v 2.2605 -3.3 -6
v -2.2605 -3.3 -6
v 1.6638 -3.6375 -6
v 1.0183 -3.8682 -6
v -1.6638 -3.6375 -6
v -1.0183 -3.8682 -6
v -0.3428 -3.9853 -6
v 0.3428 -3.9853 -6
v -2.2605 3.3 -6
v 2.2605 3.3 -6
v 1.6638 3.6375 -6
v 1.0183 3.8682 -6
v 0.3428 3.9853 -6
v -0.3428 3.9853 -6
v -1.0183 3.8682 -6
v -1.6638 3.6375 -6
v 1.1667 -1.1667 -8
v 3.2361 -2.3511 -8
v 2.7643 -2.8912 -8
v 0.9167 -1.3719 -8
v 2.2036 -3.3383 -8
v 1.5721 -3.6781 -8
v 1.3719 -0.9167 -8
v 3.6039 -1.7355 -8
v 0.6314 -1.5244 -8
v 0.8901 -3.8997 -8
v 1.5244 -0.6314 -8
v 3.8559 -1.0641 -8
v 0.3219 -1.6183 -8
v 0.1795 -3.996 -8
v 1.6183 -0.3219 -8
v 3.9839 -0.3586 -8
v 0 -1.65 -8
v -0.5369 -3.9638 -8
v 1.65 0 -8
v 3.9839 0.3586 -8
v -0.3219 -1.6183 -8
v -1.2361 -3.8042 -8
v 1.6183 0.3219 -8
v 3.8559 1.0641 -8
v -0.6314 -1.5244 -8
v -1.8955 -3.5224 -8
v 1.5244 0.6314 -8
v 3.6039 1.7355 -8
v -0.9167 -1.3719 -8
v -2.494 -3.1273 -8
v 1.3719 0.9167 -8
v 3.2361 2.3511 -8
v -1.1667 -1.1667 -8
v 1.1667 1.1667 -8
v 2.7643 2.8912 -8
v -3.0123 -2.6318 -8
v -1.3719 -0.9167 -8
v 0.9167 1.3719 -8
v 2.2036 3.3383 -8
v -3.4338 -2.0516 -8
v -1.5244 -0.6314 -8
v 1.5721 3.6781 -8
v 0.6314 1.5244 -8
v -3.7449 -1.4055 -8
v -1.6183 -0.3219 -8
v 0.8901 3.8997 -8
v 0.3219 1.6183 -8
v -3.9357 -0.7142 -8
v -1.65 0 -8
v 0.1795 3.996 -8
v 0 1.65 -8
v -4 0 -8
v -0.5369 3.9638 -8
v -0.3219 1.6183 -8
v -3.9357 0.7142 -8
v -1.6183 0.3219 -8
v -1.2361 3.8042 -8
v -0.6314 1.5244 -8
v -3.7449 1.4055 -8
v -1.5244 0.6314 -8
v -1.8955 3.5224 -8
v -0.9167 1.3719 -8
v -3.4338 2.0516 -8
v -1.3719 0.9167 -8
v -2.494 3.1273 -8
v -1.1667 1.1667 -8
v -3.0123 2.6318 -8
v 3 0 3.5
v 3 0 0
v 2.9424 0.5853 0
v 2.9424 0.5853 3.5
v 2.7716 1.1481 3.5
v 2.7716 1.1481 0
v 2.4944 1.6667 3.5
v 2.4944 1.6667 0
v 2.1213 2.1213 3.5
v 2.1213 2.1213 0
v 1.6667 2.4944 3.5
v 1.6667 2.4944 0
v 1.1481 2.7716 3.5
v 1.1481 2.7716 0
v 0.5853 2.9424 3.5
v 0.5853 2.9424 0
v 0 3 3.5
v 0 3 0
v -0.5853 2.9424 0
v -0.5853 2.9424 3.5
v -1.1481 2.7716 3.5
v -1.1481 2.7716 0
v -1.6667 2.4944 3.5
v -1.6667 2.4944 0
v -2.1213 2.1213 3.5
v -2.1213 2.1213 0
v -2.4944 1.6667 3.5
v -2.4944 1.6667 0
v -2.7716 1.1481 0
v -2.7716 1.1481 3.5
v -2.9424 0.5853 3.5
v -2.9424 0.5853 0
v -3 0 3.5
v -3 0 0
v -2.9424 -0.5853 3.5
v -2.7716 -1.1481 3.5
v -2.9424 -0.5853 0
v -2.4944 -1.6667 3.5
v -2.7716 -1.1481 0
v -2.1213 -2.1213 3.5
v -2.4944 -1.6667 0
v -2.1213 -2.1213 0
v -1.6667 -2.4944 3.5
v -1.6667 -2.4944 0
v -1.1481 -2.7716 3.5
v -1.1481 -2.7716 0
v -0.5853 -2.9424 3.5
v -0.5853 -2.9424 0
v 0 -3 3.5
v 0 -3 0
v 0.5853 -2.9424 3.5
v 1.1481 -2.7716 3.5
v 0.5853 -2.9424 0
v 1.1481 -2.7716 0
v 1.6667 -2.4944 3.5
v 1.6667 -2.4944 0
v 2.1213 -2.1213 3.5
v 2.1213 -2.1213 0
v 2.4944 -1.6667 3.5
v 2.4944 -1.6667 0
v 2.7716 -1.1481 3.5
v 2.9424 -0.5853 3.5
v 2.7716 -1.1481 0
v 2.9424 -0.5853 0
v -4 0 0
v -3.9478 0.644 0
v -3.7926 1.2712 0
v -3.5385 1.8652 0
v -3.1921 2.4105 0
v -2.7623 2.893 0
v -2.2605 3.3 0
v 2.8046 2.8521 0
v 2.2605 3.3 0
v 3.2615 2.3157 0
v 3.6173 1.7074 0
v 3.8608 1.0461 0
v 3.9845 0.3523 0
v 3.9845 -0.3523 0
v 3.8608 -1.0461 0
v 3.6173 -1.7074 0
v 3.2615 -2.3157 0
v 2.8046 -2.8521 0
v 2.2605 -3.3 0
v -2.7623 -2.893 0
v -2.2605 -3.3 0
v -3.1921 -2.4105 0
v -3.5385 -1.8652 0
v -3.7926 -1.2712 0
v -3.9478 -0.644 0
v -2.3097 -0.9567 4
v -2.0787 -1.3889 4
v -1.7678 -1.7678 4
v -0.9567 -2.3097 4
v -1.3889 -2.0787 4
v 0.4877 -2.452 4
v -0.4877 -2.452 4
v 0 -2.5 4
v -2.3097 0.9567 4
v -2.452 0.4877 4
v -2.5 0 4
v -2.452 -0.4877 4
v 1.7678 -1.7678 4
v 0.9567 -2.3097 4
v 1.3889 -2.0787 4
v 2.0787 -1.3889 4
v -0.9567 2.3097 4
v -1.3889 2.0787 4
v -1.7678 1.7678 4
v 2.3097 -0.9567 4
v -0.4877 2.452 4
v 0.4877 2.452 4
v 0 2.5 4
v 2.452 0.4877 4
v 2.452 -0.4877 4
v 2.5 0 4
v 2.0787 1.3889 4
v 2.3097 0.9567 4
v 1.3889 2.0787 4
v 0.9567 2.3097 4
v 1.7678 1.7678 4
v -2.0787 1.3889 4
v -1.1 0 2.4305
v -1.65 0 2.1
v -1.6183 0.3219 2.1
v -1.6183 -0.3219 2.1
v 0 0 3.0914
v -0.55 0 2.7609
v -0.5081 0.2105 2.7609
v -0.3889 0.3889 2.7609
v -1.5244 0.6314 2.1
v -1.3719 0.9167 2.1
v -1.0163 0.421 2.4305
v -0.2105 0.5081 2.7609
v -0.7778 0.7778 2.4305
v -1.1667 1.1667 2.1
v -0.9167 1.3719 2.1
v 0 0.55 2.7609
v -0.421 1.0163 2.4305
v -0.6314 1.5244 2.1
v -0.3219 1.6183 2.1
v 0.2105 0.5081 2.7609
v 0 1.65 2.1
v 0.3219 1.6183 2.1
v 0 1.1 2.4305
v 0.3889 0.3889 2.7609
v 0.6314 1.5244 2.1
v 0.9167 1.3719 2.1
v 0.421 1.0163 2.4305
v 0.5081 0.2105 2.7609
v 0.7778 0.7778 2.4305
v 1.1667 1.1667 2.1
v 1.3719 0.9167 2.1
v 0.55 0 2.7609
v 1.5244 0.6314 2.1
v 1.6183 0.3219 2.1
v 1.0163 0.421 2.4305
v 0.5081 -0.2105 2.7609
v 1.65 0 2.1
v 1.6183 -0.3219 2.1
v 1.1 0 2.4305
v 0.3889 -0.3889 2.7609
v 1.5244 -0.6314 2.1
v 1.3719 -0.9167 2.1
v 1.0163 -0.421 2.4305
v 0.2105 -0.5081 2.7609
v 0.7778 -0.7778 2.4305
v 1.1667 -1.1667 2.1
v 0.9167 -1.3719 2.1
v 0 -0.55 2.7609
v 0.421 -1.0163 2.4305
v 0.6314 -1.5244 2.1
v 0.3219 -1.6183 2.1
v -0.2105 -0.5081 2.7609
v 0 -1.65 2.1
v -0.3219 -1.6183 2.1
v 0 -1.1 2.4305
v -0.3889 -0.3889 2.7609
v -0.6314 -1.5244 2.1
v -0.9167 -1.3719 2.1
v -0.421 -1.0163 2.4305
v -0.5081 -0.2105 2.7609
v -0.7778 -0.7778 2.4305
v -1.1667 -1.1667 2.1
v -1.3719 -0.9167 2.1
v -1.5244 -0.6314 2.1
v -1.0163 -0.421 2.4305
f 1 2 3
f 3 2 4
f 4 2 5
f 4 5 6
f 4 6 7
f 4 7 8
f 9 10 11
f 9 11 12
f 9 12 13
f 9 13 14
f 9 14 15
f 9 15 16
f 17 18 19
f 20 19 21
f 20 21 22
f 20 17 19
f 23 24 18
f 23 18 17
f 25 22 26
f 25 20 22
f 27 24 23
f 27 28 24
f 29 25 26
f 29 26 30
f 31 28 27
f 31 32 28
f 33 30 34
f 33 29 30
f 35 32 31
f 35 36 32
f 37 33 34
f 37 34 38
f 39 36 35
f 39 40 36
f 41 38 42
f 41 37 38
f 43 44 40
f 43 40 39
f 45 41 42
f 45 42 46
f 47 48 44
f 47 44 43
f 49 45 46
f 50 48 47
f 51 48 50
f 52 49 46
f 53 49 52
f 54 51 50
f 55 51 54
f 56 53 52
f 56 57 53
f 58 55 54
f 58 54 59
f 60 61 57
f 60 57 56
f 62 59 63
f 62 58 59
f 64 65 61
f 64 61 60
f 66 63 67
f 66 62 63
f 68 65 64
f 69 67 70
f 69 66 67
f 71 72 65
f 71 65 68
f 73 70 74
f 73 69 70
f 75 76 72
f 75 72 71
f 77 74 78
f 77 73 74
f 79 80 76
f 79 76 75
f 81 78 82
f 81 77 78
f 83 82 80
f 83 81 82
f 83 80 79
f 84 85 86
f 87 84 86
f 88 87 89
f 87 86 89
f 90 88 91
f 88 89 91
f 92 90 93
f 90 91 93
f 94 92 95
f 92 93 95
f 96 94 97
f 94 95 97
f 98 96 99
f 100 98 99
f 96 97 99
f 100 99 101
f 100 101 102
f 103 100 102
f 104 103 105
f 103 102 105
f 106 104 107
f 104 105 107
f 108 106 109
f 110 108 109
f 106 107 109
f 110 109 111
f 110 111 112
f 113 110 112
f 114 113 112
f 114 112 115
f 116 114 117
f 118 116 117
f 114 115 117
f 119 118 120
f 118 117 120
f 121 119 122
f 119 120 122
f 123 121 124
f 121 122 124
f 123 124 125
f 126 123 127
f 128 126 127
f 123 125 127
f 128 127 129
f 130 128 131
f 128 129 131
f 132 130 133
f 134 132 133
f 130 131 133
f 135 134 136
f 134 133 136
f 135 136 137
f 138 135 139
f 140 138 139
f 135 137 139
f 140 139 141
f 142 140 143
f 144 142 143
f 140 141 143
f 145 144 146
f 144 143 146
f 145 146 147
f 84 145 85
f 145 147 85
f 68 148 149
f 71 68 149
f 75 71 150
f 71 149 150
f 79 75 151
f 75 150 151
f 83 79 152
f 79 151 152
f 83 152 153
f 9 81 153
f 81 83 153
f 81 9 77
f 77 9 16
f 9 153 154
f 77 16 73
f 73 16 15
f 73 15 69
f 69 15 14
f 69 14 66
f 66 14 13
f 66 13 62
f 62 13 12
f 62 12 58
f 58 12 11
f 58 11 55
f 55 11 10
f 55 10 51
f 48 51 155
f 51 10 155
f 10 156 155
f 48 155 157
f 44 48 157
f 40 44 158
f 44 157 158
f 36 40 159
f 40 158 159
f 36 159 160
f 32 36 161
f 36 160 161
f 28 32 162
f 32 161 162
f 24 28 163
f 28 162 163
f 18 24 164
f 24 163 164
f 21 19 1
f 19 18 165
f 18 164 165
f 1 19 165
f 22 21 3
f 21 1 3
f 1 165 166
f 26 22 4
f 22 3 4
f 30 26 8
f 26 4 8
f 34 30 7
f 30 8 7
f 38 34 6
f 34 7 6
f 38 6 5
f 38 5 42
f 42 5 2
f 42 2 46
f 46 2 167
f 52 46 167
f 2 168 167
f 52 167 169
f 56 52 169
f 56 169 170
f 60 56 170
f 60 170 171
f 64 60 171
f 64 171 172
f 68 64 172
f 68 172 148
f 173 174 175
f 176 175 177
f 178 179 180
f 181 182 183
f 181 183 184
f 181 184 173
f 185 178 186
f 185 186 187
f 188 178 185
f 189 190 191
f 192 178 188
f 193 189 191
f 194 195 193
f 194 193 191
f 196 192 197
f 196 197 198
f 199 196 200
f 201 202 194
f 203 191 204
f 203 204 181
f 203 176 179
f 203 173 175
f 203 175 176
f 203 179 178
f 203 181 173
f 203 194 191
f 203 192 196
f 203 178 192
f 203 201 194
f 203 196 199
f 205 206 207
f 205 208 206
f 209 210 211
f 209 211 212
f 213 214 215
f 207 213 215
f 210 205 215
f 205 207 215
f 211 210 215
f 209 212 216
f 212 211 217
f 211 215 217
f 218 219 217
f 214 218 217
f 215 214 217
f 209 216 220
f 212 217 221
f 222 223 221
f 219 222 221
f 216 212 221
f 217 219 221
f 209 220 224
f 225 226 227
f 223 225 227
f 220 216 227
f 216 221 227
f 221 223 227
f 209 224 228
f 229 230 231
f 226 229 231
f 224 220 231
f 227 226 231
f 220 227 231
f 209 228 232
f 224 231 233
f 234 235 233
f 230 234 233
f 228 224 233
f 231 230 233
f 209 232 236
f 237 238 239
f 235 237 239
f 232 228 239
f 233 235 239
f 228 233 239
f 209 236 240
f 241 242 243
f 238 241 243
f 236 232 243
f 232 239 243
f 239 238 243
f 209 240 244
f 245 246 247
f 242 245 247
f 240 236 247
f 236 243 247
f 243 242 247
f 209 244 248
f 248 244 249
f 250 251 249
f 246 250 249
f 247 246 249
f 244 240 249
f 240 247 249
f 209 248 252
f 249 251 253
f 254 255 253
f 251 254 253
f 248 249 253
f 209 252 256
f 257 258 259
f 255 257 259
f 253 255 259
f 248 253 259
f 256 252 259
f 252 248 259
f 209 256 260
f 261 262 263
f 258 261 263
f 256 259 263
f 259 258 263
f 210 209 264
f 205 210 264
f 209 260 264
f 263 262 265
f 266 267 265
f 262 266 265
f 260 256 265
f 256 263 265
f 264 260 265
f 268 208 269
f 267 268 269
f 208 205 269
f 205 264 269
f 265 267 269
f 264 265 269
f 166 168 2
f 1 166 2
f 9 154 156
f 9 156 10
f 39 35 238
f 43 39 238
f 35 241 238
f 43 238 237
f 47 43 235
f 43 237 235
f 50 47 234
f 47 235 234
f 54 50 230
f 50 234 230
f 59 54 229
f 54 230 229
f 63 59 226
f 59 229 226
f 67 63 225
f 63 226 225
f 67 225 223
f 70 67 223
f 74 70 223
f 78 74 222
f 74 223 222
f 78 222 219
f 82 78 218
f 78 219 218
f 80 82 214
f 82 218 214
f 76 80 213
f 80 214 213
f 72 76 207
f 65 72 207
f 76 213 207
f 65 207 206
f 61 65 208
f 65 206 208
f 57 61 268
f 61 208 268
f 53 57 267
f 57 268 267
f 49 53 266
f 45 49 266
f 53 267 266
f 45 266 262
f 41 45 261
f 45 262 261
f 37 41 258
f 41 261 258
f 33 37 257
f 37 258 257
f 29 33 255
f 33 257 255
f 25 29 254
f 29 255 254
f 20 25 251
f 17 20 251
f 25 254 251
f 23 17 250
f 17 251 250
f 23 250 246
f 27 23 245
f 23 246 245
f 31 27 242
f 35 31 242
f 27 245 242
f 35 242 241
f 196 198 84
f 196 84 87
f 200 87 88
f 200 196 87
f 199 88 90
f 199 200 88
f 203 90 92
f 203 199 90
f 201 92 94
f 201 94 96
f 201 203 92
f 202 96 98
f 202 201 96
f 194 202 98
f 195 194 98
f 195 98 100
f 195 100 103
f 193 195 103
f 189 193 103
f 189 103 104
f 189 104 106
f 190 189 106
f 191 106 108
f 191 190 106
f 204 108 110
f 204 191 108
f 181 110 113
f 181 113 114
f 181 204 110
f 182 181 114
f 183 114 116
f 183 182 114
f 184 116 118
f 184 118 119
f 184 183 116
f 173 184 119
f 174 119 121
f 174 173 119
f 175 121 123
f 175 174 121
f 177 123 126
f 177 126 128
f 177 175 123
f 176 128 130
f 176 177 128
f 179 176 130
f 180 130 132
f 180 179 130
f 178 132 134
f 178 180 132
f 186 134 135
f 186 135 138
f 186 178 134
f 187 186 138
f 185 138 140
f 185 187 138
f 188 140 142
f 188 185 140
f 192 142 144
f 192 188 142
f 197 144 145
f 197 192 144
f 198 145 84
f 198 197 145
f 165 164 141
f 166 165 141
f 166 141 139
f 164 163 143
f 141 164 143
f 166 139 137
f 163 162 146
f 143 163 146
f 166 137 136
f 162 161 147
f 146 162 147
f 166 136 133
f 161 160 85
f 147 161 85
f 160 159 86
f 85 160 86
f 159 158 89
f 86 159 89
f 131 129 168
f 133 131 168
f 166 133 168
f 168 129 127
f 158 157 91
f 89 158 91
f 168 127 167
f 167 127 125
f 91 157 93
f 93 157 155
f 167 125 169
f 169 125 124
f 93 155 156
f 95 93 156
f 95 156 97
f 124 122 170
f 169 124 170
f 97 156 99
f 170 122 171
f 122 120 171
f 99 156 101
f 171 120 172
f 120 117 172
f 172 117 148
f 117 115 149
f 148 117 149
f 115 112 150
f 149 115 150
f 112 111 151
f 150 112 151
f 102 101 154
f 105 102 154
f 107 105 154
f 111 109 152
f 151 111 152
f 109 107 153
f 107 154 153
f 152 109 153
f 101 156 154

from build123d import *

# Parameters (mm, degrees)
SKETCH_1_R               = 3
EXTRUDE_1_DEPTH          = 4
CHAMFER_1_SIZE           = 0.5
SKETCH_4_R               = 4
EXTRUDE_2_DEPTH          = 8
HOLE_WIZARD_M4_2_D       = 3.3
HOLE_WIZARD_M4_2_DEPTH   = 10.1
HOLE_WIZARD_M4_2_TIP     = 0.991420021
CUT_EXTRUDE_1_DEPTH      = 10.797958971
CUT_EXTRUDE_1_DEPTH_BACK = 10.797958971
SKETCH_7_W               = 6.66597258
SKETCH_7_H               = 2.440047967


with BuildPart() as part:
    # 草图1 → 凸台-拉伸1 (new body)
    with BuildSketch(Plane.XY):
        Circle(SKETCH_1_R)
    extrude(amount=EXTRUDE_1_DEPTH)

    # 倒角1
    chamfer_1_edges = [part.edges().sort_by_distance(p)[0] for p in [
        (-3, 0, 4),
    ]]
    chamfer(chamfer_1_edges, length=CHAMFER_1_SIZE)

    # 草图4 → 凸台-拉伸2 (add)
    with BuildSketch(Plane(origin=(0, 0, 0), x_dir=(-1, 0, 0), z_dir=(0, 0, -1))):
        Circle(SKETCH_4_R)
    extrude(amount=EXTRUDE_2_DEPTH)

    # M4 螺纹孔2
    with Locations(Plane(origin=(0, 0, -8), x_dir=(-1, 0, 0), z_dir=(0, 0, -1))):
        with Locations((0, 0)):
            Hole(HOLE_WIZARD_M4_2_D / 2, depth=HOLE_WIZARD_M4_2_DEPTH)
            with Locations((0, 0, -(HOLE_WIZARD_M4_2_DEPTH + HOLE_WIZARD_M4_2_TIP / 2))):  # 118° drill point
                Cone(0, HOLE_WIZARD_M4_2_D / 2, HOLE_WIZARD_M4_2_TIP, mode=Mode.SUBTRACT)

    # 草图7 → 切除-拉伸1 (cut, two sides: drawn at the far end of the back side and taken through both)
    with BuildSketch(Plane(origin=(0, 0, 0), x_dir=(0, 0, -1), z_dir=(1, 0, 0)).offset(-CUT_EXTRUDE_1_DEPTH_BACK)):
        with Locations((2.66701371, 4.520023984)):
            Rectangle(SKETCH_7_W, SKETCH_7_H)
        with Locations((2.66701371, -4.520023984)):
            Rectangle(SKETCH_7_W, SKETCH_7_H)
    extrude(amount=CUT_EXTRUDE_1_DEPTH + CUT_EXTRUDE_1_DEPTH_BACK, mode=Mode.SUBTRACT)


solid = part.part
